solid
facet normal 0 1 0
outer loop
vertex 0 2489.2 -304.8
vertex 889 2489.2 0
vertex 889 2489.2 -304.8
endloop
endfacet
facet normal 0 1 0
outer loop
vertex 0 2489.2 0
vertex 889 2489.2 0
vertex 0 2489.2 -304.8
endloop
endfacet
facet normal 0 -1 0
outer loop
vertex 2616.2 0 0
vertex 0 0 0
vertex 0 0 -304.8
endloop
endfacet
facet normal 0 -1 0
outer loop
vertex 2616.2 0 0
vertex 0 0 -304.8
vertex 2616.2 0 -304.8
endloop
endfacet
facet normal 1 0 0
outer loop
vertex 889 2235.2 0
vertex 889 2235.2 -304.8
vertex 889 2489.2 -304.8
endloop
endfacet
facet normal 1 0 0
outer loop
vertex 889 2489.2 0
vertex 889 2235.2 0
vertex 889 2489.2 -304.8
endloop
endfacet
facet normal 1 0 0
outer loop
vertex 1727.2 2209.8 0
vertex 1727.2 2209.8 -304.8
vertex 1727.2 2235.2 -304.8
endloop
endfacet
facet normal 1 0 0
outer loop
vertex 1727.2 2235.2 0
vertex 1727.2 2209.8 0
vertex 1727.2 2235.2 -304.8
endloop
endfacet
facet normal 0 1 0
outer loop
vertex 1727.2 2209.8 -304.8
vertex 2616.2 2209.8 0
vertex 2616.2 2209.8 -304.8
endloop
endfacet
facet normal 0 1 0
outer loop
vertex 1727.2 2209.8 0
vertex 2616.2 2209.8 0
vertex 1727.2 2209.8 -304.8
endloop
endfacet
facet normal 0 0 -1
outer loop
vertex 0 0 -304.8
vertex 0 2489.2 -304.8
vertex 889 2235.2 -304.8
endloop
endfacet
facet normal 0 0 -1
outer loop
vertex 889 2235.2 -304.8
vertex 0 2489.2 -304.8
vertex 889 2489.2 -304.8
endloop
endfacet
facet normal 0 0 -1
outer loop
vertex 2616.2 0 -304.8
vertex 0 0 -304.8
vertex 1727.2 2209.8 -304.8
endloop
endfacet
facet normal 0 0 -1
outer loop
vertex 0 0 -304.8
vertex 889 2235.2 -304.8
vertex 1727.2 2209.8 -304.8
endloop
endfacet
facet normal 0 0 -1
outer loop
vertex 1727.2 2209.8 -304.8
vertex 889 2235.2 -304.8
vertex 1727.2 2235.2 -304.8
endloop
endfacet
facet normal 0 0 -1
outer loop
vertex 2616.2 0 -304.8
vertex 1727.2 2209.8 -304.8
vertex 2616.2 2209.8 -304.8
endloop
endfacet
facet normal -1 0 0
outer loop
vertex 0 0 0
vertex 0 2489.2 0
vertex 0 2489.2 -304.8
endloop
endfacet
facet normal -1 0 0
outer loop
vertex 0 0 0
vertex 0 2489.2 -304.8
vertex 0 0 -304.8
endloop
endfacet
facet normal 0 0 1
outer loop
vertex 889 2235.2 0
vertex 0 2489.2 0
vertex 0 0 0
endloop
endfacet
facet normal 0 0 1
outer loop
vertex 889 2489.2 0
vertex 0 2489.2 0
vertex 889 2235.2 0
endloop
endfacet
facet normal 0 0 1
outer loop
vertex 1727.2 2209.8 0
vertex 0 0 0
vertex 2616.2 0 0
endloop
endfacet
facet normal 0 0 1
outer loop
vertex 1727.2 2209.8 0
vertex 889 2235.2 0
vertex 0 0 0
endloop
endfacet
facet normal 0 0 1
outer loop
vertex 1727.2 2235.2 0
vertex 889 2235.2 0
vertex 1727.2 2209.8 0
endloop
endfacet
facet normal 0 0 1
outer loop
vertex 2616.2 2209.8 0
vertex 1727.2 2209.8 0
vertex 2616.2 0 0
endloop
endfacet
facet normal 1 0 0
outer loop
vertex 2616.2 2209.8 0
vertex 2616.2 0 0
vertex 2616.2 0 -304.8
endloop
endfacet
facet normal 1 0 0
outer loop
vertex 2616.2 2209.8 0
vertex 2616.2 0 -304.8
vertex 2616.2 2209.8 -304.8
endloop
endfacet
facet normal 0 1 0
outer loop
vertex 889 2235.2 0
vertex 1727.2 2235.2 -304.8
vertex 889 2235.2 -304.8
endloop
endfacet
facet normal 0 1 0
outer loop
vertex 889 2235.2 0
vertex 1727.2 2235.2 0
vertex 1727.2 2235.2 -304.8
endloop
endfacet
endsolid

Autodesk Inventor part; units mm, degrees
ref_plane "YZ Plane" through (0, 0, 0) normal (1, 0, 0) x (0, 1, 0)
ref_plane "XZ Plane" through (0, 0, 0) normal (0, 1, 0) x (-1, 0, 0)
ref_plane "XY Plane" through (0, 0, 0) normal (0, 0, 1) x (1, 0, 0)
sketch "Sketch1" plane through (0, 0, 0) normal (0, 0, 1) x (1, 0, 0)
  line L0 (0, 0) -> (889, 0)
  line L1 (889, 0) -> (889, 2489.2)
  line L2 (889, 2489.2) -> (0, 2489.2)
  line L3 (0, 2489.2) -> (0, 0)
  line L4 (889, 0) -> (1727.2, 0)
  line L5 (1727.2, 0) -> (1727.2, 2235.2)
  line L6 (1727.2, 2235.2) -> (889, 2235.2)
  line L7 (889, 2235.2) -> (889, 0)
  line L8 (1727.2, 0) -> (2616.2, 0)
  line L9 (2616.2, 0) -> (2616.2, 2209.8)
  line L10 (2616.2, 2209.8) -> (1727.2, 2209.8)
  line L11 (1727.2, 2209.8) -> (1727.2, 0)
  line L12 (2616.2, 0) -> (3454.4, 0)
  line L13 (3454.4, 0) -> (3454.4, 2489.2)
  line L14 (3454.4, 2489.2) -> (2616.2, 2489.2)
  line L15 (2616.2, 2489.2) -> (2616.2, 0)
  point P0 (2616.2, 1219.2)
  point P1 (1727.2, 1320.8)
  point P2 (889, 1219.2)
  dimension "d0" = 889
  dimension "d1" = 2489.2
  dimension "d2" = 838.2
  dimension "d3" = 2235.2
  dimension "d4" = 889
  dimension "d5" = 2209.8
  dimension "d6" = 838.2
  dimension "d7" = 2489.2
  dimension "d10" = 3454.4
extrude "Extrusion1" add sketch "Sketch1" against normal blind 304.8 contours L3 L2 L1 L0 | L1 L6 L5 L4 | L5 L10 L9 L8
properties part number "unwrappedChimney"
